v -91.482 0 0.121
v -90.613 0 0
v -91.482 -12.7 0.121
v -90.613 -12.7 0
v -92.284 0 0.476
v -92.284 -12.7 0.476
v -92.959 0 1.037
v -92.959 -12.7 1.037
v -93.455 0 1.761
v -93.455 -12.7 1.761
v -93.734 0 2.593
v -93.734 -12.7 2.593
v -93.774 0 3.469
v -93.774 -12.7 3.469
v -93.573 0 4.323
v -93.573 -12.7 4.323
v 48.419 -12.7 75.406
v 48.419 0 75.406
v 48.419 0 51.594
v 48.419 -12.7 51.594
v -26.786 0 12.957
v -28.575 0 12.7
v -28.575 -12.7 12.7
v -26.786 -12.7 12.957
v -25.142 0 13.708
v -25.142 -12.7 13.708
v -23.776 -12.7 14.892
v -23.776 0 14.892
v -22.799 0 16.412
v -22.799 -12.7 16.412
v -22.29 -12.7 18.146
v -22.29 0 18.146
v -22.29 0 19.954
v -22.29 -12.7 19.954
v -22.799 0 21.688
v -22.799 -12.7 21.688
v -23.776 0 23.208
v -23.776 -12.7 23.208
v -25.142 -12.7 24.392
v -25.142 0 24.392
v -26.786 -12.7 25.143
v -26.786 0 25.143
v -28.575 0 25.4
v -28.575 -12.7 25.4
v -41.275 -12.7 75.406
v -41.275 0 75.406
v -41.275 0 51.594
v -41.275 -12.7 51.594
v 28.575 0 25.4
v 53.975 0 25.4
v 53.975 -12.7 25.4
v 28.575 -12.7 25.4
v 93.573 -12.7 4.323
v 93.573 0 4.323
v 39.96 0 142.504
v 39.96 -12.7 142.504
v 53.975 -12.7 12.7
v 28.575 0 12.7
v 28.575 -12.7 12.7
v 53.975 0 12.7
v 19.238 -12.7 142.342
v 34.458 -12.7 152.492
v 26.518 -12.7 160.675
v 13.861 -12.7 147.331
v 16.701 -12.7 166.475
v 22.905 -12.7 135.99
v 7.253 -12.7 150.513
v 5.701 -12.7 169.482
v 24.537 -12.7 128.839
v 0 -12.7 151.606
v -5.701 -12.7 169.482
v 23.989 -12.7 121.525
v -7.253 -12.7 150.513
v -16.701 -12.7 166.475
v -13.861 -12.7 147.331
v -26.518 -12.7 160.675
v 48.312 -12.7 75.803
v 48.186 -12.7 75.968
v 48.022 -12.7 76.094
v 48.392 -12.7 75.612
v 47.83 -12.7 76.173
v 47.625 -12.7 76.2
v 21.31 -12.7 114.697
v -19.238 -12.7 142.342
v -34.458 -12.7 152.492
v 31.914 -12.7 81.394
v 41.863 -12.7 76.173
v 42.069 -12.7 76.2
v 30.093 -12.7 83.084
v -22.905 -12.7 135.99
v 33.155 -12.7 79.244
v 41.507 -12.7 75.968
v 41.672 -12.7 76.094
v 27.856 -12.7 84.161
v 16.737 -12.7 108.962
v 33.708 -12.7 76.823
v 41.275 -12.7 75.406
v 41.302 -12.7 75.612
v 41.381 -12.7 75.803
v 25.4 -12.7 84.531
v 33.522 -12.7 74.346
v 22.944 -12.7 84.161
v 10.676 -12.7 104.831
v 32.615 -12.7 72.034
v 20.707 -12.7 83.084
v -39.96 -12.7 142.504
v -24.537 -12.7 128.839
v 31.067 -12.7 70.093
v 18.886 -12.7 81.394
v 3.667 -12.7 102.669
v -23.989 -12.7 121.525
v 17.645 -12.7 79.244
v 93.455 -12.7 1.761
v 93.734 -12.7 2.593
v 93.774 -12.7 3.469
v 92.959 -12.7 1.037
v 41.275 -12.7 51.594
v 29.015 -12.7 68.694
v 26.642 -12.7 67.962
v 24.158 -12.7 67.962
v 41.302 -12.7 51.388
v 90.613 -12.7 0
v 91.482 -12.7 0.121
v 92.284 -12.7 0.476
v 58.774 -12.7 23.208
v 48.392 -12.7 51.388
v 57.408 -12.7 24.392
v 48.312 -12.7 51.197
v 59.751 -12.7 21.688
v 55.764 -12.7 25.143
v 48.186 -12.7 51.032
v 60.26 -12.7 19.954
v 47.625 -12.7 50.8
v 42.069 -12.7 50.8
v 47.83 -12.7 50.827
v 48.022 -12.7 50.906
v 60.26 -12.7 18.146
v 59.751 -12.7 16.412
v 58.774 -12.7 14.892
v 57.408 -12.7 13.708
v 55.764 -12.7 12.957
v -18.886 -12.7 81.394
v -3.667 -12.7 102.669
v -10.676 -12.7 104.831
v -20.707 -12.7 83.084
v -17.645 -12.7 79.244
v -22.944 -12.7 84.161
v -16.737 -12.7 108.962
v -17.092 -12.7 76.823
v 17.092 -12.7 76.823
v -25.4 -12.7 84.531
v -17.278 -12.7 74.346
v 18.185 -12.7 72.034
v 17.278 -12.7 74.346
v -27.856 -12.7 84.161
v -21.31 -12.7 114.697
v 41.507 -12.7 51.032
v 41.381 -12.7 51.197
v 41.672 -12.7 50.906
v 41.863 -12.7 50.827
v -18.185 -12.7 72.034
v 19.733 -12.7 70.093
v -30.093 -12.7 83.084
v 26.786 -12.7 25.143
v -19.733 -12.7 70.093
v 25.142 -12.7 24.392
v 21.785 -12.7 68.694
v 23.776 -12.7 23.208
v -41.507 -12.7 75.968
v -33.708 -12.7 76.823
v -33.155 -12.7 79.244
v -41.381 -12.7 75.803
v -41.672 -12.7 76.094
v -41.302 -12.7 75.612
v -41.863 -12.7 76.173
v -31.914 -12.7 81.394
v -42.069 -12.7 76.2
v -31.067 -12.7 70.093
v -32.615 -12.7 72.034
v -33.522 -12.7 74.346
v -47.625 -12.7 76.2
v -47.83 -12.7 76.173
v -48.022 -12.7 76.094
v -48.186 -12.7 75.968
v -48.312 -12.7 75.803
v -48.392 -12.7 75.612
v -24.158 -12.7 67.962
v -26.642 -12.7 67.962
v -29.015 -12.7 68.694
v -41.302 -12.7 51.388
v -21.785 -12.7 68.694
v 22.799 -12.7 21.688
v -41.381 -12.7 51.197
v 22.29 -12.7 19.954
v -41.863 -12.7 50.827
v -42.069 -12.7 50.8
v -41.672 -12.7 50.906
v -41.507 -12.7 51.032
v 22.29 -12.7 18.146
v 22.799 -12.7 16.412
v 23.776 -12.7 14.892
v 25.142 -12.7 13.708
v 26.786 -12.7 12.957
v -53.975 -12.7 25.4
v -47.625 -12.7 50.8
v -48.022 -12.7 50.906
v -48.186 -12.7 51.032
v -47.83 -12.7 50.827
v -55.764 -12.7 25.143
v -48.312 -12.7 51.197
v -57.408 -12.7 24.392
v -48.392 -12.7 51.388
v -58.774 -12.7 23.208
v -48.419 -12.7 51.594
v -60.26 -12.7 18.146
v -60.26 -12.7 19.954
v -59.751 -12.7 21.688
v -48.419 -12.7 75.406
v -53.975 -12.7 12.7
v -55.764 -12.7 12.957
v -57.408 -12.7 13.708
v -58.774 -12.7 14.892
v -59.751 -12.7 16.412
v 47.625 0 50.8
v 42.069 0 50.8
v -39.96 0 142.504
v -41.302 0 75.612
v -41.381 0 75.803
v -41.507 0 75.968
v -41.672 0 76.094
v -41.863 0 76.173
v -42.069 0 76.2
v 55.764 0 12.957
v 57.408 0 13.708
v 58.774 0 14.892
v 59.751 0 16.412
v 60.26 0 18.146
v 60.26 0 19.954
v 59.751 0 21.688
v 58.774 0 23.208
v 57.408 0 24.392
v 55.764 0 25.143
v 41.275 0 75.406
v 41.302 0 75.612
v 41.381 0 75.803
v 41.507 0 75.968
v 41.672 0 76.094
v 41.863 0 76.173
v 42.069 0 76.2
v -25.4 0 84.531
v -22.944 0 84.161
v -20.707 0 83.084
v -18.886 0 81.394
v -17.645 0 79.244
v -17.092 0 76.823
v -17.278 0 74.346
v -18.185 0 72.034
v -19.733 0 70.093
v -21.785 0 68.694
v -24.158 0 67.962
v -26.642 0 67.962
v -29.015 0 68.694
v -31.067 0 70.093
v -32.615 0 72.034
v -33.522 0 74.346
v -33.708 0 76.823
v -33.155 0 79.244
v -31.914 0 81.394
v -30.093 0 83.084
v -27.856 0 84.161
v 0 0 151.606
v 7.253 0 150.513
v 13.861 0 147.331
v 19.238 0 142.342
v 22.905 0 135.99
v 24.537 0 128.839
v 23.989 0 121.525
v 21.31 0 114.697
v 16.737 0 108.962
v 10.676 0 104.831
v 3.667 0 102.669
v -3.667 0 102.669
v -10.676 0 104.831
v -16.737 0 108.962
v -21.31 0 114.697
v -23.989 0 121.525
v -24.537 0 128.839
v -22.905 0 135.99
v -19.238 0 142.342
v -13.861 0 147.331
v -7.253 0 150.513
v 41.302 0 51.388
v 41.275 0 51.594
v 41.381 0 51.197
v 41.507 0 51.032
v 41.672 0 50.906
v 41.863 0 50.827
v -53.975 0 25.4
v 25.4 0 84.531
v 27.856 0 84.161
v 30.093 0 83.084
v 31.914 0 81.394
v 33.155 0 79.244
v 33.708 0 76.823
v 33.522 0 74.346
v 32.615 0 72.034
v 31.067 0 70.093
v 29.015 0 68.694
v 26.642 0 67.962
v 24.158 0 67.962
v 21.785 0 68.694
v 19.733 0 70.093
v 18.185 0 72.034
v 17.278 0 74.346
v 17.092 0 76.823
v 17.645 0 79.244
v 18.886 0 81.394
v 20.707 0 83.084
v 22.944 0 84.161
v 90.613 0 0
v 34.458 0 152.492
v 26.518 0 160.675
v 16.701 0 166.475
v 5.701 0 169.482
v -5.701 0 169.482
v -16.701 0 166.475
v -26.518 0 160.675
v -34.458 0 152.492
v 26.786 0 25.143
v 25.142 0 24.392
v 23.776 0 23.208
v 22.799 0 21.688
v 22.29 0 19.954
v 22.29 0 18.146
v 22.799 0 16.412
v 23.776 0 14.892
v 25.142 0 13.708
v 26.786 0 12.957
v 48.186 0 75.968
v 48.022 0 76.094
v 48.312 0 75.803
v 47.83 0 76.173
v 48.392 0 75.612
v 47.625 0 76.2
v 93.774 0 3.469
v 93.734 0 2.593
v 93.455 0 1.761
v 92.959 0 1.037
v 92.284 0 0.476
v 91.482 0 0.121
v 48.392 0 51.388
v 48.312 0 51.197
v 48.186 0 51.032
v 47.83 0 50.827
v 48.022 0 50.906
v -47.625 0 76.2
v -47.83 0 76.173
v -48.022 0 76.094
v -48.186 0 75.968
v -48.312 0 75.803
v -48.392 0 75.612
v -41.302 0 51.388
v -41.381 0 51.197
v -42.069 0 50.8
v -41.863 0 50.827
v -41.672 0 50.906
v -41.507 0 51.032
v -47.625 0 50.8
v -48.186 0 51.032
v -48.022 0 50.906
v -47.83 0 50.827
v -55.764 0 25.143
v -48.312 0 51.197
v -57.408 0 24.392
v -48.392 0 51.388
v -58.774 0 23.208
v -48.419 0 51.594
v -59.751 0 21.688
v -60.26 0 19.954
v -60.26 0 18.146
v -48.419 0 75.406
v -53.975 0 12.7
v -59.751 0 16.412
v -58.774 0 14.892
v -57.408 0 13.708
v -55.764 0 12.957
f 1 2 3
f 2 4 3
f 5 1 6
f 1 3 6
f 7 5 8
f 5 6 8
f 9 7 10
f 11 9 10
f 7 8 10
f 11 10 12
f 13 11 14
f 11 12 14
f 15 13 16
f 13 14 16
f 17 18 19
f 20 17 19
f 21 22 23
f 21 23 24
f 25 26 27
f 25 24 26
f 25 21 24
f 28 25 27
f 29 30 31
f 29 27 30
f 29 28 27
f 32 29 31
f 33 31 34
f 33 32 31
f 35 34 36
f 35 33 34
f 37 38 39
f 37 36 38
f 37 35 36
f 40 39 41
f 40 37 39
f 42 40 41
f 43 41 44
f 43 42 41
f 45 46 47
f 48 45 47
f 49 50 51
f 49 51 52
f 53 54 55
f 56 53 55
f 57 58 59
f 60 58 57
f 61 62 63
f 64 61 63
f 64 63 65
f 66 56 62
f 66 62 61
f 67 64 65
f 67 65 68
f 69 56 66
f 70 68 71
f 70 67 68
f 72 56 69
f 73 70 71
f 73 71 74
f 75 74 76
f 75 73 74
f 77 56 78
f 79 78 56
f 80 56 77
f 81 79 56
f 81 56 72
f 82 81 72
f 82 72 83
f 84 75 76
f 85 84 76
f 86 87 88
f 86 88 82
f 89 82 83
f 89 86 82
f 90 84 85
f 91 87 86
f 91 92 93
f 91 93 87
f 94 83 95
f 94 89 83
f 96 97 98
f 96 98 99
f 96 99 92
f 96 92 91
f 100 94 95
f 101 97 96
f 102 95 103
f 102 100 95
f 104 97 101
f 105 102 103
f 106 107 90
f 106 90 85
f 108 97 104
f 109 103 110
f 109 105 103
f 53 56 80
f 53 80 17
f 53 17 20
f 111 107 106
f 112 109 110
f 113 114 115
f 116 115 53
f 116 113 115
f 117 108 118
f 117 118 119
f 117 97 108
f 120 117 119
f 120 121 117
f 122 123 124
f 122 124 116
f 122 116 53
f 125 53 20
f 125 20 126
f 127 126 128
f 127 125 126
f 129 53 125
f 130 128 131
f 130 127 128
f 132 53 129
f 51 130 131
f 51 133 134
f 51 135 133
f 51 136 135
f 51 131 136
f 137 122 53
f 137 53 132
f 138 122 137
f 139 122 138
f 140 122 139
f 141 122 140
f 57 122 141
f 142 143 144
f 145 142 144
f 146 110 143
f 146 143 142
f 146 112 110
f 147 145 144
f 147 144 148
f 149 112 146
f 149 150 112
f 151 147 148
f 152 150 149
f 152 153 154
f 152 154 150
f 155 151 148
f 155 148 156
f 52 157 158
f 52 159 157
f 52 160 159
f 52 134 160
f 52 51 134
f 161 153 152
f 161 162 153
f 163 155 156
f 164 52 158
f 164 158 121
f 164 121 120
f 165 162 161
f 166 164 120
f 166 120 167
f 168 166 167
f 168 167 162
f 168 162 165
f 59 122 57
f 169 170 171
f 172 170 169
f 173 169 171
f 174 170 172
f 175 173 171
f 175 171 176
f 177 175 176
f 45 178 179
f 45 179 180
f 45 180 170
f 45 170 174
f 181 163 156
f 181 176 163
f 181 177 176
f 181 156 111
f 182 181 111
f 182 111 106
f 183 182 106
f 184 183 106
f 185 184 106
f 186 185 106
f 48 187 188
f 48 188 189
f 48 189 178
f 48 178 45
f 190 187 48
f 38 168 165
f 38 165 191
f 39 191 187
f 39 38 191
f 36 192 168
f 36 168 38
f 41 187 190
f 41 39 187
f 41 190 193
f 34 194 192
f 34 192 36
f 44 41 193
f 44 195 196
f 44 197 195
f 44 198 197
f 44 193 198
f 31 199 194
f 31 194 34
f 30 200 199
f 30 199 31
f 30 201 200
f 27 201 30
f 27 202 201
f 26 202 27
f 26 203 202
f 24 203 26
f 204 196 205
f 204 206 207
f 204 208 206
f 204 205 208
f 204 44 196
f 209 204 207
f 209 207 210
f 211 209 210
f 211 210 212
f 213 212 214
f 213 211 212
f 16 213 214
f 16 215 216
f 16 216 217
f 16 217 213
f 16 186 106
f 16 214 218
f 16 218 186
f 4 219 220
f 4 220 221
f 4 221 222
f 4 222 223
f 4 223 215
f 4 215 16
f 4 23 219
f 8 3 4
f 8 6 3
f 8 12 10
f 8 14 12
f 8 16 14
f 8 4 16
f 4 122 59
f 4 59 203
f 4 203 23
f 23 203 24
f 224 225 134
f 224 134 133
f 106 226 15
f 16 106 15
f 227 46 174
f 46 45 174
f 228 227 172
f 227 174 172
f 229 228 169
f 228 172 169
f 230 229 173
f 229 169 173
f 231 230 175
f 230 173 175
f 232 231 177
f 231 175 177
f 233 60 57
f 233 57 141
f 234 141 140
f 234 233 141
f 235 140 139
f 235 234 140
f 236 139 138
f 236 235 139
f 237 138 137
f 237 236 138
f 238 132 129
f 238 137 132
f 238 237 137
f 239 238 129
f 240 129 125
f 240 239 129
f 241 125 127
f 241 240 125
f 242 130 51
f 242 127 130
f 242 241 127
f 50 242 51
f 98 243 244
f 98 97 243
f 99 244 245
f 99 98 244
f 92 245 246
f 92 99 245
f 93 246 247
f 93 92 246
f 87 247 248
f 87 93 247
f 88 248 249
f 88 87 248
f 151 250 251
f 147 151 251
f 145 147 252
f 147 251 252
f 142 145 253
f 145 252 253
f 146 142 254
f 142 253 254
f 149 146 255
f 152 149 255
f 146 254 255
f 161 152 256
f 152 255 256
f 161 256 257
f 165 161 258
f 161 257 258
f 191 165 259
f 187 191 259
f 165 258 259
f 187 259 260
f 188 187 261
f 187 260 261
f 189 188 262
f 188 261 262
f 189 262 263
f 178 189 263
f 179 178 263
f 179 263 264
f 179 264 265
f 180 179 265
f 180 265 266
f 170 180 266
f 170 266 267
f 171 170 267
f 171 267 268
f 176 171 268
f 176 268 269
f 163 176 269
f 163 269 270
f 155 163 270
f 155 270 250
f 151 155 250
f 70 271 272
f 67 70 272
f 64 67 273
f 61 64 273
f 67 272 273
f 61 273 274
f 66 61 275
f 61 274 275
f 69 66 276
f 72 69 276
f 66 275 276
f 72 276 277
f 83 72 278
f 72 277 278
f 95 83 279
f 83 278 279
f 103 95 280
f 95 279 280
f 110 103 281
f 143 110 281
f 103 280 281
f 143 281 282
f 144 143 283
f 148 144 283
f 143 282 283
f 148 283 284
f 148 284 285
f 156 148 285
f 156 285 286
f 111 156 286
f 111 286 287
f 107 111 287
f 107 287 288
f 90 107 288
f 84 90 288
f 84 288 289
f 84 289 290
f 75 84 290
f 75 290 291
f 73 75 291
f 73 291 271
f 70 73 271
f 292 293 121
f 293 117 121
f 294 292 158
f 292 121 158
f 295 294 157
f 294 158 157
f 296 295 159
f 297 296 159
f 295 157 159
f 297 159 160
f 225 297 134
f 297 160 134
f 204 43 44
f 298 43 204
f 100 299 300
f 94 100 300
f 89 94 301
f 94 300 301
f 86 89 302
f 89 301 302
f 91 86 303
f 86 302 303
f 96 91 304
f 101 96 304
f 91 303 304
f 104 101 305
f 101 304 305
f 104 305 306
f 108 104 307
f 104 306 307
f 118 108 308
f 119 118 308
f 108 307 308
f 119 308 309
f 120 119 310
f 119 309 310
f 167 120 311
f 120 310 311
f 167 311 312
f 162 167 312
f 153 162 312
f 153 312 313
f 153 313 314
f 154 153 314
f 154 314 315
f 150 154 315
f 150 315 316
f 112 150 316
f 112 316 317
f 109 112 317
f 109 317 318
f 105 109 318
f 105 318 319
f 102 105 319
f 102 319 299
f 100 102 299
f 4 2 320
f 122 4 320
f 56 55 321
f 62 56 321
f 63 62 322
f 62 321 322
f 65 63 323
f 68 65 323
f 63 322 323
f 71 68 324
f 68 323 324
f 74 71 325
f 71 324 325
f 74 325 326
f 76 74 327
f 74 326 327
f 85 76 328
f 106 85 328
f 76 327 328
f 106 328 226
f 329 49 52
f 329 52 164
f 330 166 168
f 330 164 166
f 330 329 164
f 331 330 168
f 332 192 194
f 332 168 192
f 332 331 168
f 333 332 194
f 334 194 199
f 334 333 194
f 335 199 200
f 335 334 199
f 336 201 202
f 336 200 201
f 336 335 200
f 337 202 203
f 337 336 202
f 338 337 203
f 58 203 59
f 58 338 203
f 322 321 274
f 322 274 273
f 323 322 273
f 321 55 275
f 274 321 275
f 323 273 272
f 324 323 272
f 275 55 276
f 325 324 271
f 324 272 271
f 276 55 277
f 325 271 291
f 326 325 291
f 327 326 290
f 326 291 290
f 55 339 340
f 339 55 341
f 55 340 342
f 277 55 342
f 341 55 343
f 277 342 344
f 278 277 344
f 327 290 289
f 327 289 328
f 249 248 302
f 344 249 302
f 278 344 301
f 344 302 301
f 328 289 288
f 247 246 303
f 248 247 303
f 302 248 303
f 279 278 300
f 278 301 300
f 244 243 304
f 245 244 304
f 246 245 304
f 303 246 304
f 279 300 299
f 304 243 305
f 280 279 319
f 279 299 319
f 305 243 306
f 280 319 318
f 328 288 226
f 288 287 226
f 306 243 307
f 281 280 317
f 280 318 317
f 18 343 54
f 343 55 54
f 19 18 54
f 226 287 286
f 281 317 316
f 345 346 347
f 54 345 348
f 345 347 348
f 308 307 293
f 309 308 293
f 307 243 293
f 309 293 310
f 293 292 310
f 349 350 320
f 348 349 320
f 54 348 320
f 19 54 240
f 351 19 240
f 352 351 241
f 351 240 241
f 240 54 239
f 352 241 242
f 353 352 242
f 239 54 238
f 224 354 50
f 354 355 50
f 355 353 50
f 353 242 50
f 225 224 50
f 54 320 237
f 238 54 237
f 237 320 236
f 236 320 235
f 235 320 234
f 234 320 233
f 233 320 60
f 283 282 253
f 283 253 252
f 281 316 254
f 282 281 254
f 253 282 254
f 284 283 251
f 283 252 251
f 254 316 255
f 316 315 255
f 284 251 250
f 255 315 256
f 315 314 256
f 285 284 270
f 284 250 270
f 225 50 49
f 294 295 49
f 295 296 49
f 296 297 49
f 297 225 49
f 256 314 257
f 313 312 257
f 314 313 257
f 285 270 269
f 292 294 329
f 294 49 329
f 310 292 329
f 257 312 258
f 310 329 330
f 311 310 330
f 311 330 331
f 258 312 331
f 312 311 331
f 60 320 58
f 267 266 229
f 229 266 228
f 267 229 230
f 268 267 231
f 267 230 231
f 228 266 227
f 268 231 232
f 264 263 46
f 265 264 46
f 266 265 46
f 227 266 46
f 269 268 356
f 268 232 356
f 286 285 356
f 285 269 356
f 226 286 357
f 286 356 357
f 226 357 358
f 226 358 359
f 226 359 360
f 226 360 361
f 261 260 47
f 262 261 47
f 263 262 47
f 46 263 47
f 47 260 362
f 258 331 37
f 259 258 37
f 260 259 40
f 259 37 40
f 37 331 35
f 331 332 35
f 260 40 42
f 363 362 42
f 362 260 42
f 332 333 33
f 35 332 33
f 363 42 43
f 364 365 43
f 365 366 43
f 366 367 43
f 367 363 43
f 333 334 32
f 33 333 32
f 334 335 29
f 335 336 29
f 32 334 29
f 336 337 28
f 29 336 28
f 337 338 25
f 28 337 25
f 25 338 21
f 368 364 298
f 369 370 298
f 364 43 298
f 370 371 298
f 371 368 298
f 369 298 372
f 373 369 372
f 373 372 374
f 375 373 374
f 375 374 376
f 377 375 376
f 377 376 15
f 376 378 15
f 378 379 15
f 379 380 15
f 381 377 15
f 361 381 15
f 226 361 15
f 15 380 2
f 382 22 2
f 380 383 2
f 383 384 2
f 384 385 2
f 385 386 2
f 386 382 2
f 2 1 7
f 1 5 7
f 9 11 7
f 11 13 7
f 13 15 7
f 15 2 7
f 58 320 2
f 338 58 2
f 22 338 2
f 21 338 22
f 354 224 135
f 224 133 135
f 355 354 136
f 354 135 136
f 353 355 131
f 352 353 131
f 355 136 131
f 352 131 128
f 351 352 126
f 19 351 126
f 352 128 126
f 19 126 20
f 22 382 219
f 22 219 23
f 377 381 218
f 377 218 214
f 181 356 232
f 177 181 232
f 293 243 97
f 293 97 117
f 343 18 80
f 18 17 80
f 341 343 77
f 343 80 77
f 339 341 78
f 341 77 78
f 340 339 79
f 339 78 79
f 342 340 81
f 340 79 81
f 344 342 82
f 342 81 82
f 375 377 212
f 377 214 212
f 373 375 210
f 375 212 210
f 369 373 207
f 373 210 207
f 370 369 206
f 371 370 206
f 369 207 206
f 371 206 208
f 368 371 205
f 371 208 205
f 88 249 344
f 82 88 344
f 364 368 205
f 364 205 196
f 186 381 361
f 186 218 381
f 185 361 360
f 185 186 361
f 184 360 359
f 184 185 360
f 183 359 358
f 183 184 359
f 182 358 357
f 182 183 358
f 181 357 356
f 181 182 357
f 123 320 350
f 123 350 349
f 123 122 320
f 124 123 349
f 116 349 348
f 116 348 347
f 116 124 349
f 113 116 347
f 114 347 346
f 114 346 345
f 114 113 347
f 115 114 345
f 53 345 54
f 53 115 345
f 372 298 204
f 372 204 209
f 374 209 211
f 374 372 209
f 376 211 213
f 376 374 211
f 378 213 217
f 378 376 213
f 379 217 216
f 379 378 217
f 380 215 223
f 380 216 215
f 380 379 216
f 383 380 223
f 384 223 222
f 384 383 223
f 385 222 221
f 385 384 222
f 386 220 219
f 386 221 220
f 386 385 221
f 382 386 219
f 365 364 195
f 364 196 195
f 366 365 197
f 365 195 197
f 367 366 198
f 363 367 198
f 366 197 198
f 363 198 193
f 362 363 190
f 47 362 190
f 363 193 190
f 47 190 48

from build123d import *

# Parameters (mm, degrees)
BASE_FLANGE1_DEPTH = 12.7
SKETCH2_R          = 24.60625
SKETCH2_R_2        = 8.3312
CUT_EXTRUDE1_DEPTH = 196.159220654
CUT_EXTRUDE2_DEPTH = 196.159220654
FILLET1_R          = 3.175
SKETCH8_W          = 7.14375
SKETCH8_H          = 25.4
CUT_EXTRUDE3_DEPTH = 195.449637912
FILLET2_R          = 0.79375


# Sheet-metal steps are written as plain solids
with BuildPart() as part:
    # Sketch1 → Base-Flange1 (new body)
    with BuildSketch(Plane(origin=(0, 0, 0), x_dir=(1, 0, 0), z_dir=(0, 1, 0))):
        with BuildLine():
            Line((-95.25, 0), (95.25, 0))
            Line((95.25, 0), (39.960205447, -142.504060335))
            ThreePointArc((39.960205447, -142.504060335), (0, -169.8625), (-39.960205447, -142.504060335))
            Line((-39.960205447, -142.504060335), (-95.25, 0))
        make_face()
    extrude(amount=-BASE_FLANGE1_DEPTH)

    # Sketch2 → Cut-Extrude1 (cut, through all)
    with BuildSketch(Plane(origin=(0, 0, 0), x_dir=(1, 0, 0), z_dir=(0, 1, 0))):
        with Locations(Location((0, -127, 0), (0, 0, 270))):
            Circle(SKETCH2_R)
        with Locations(Location((-25.4, -76.2, 0), (0, 0, 270))):
            Circle(SKETCH2_R_2)
        with Locations(Location((25.4, -76.2, 0), (0, 0, 270))):
            Circle(SKETCH2_R_2)
    extrude(amount=-CUT_EXTRUDE1_DEPTH, mode=Mode.SUBTRACT)

    # Sketch7 → Cut-Extrude2 (cut, through all)
    with BuildSketch(Plane(origin=(0, 0, 0), x_dir=(1, 0, 0), z_dir=(0, 1, 0))):
        with BuildLine():
            Line((53.975, -25.4), (28.575, -25.4))
            ThreePointArc((28.575, -25.4), (22.225, -19.05), (28.575, -12.7))
            Line((28.575, -12.7), (53.975, -12.7))
            ThreePointArc((53.975, -12.7), (60.325, -19.05), (53.975, -25.4))
        make_face()
        with BuildLine():
            Line((-28.575, -25.4), (-53.975, -25.4))
            ThreePointArc((-53.975, -25.4), (-60.325, -19.05), (-53.975, -12.7))
            Line((-53.975, -12.7), (-28.575, -12.7))
            ThreePointArc((-28.575, -12.7), (-22.225, -19.05), (-28.575, -25.4))
        make_face()
    extrude(amount=-CUT_EXTRUDE2_DEPTH, mode=Mode.SUBTRACT)

    # Fillet1
    fillet1_edges = [part.edges().sort_by_distance(p)[0] for p in [
        (-95.25, -6.35, 0),
        (95.25, -6.35, 0),
    ]]
    fillet(fillet1_edges, radius=FILLET1_R)

    # Sketch8 → Cut-Extrude3 (cut, through all)
    with BuildSketch(Plane(origin=(0, 0, 0), x_dir=(1, 0, 0), z_dir=(0, 1, 0))):
        with Locations((44.846875, -63.5)):
            Rectangle(SKETCH8_W, SKETCH8_H)
        with Locations((-44.846875, -63.5)):
            Rectangle(SKETCH8_W, SKETCH8_H)
    extrude(amount=-CUT_EXTRUDE3_DEPTH, mode=Mode.SUBTRACT)

    # Fillet2
    fillet2_edges = [part.edges().sort_by_distance(p)[0] for p in [
        (41.275, -6.35, 76.2),
        (41.275, -6.35, 50.8),
        (48.41875, -6.35, 50.8),
        (48.41875, -6.35, 76.2),
        (-48.41875, -6.35, 76.2),
        (-48.41875, -6.35, 50.8),
        (-41.275, -6.35, 50.8),
        (-41.275, -6.35, 76.2),
    ]]
    fillet(fillet2_edges, radius=FILLET2_R)


solid = part.part
